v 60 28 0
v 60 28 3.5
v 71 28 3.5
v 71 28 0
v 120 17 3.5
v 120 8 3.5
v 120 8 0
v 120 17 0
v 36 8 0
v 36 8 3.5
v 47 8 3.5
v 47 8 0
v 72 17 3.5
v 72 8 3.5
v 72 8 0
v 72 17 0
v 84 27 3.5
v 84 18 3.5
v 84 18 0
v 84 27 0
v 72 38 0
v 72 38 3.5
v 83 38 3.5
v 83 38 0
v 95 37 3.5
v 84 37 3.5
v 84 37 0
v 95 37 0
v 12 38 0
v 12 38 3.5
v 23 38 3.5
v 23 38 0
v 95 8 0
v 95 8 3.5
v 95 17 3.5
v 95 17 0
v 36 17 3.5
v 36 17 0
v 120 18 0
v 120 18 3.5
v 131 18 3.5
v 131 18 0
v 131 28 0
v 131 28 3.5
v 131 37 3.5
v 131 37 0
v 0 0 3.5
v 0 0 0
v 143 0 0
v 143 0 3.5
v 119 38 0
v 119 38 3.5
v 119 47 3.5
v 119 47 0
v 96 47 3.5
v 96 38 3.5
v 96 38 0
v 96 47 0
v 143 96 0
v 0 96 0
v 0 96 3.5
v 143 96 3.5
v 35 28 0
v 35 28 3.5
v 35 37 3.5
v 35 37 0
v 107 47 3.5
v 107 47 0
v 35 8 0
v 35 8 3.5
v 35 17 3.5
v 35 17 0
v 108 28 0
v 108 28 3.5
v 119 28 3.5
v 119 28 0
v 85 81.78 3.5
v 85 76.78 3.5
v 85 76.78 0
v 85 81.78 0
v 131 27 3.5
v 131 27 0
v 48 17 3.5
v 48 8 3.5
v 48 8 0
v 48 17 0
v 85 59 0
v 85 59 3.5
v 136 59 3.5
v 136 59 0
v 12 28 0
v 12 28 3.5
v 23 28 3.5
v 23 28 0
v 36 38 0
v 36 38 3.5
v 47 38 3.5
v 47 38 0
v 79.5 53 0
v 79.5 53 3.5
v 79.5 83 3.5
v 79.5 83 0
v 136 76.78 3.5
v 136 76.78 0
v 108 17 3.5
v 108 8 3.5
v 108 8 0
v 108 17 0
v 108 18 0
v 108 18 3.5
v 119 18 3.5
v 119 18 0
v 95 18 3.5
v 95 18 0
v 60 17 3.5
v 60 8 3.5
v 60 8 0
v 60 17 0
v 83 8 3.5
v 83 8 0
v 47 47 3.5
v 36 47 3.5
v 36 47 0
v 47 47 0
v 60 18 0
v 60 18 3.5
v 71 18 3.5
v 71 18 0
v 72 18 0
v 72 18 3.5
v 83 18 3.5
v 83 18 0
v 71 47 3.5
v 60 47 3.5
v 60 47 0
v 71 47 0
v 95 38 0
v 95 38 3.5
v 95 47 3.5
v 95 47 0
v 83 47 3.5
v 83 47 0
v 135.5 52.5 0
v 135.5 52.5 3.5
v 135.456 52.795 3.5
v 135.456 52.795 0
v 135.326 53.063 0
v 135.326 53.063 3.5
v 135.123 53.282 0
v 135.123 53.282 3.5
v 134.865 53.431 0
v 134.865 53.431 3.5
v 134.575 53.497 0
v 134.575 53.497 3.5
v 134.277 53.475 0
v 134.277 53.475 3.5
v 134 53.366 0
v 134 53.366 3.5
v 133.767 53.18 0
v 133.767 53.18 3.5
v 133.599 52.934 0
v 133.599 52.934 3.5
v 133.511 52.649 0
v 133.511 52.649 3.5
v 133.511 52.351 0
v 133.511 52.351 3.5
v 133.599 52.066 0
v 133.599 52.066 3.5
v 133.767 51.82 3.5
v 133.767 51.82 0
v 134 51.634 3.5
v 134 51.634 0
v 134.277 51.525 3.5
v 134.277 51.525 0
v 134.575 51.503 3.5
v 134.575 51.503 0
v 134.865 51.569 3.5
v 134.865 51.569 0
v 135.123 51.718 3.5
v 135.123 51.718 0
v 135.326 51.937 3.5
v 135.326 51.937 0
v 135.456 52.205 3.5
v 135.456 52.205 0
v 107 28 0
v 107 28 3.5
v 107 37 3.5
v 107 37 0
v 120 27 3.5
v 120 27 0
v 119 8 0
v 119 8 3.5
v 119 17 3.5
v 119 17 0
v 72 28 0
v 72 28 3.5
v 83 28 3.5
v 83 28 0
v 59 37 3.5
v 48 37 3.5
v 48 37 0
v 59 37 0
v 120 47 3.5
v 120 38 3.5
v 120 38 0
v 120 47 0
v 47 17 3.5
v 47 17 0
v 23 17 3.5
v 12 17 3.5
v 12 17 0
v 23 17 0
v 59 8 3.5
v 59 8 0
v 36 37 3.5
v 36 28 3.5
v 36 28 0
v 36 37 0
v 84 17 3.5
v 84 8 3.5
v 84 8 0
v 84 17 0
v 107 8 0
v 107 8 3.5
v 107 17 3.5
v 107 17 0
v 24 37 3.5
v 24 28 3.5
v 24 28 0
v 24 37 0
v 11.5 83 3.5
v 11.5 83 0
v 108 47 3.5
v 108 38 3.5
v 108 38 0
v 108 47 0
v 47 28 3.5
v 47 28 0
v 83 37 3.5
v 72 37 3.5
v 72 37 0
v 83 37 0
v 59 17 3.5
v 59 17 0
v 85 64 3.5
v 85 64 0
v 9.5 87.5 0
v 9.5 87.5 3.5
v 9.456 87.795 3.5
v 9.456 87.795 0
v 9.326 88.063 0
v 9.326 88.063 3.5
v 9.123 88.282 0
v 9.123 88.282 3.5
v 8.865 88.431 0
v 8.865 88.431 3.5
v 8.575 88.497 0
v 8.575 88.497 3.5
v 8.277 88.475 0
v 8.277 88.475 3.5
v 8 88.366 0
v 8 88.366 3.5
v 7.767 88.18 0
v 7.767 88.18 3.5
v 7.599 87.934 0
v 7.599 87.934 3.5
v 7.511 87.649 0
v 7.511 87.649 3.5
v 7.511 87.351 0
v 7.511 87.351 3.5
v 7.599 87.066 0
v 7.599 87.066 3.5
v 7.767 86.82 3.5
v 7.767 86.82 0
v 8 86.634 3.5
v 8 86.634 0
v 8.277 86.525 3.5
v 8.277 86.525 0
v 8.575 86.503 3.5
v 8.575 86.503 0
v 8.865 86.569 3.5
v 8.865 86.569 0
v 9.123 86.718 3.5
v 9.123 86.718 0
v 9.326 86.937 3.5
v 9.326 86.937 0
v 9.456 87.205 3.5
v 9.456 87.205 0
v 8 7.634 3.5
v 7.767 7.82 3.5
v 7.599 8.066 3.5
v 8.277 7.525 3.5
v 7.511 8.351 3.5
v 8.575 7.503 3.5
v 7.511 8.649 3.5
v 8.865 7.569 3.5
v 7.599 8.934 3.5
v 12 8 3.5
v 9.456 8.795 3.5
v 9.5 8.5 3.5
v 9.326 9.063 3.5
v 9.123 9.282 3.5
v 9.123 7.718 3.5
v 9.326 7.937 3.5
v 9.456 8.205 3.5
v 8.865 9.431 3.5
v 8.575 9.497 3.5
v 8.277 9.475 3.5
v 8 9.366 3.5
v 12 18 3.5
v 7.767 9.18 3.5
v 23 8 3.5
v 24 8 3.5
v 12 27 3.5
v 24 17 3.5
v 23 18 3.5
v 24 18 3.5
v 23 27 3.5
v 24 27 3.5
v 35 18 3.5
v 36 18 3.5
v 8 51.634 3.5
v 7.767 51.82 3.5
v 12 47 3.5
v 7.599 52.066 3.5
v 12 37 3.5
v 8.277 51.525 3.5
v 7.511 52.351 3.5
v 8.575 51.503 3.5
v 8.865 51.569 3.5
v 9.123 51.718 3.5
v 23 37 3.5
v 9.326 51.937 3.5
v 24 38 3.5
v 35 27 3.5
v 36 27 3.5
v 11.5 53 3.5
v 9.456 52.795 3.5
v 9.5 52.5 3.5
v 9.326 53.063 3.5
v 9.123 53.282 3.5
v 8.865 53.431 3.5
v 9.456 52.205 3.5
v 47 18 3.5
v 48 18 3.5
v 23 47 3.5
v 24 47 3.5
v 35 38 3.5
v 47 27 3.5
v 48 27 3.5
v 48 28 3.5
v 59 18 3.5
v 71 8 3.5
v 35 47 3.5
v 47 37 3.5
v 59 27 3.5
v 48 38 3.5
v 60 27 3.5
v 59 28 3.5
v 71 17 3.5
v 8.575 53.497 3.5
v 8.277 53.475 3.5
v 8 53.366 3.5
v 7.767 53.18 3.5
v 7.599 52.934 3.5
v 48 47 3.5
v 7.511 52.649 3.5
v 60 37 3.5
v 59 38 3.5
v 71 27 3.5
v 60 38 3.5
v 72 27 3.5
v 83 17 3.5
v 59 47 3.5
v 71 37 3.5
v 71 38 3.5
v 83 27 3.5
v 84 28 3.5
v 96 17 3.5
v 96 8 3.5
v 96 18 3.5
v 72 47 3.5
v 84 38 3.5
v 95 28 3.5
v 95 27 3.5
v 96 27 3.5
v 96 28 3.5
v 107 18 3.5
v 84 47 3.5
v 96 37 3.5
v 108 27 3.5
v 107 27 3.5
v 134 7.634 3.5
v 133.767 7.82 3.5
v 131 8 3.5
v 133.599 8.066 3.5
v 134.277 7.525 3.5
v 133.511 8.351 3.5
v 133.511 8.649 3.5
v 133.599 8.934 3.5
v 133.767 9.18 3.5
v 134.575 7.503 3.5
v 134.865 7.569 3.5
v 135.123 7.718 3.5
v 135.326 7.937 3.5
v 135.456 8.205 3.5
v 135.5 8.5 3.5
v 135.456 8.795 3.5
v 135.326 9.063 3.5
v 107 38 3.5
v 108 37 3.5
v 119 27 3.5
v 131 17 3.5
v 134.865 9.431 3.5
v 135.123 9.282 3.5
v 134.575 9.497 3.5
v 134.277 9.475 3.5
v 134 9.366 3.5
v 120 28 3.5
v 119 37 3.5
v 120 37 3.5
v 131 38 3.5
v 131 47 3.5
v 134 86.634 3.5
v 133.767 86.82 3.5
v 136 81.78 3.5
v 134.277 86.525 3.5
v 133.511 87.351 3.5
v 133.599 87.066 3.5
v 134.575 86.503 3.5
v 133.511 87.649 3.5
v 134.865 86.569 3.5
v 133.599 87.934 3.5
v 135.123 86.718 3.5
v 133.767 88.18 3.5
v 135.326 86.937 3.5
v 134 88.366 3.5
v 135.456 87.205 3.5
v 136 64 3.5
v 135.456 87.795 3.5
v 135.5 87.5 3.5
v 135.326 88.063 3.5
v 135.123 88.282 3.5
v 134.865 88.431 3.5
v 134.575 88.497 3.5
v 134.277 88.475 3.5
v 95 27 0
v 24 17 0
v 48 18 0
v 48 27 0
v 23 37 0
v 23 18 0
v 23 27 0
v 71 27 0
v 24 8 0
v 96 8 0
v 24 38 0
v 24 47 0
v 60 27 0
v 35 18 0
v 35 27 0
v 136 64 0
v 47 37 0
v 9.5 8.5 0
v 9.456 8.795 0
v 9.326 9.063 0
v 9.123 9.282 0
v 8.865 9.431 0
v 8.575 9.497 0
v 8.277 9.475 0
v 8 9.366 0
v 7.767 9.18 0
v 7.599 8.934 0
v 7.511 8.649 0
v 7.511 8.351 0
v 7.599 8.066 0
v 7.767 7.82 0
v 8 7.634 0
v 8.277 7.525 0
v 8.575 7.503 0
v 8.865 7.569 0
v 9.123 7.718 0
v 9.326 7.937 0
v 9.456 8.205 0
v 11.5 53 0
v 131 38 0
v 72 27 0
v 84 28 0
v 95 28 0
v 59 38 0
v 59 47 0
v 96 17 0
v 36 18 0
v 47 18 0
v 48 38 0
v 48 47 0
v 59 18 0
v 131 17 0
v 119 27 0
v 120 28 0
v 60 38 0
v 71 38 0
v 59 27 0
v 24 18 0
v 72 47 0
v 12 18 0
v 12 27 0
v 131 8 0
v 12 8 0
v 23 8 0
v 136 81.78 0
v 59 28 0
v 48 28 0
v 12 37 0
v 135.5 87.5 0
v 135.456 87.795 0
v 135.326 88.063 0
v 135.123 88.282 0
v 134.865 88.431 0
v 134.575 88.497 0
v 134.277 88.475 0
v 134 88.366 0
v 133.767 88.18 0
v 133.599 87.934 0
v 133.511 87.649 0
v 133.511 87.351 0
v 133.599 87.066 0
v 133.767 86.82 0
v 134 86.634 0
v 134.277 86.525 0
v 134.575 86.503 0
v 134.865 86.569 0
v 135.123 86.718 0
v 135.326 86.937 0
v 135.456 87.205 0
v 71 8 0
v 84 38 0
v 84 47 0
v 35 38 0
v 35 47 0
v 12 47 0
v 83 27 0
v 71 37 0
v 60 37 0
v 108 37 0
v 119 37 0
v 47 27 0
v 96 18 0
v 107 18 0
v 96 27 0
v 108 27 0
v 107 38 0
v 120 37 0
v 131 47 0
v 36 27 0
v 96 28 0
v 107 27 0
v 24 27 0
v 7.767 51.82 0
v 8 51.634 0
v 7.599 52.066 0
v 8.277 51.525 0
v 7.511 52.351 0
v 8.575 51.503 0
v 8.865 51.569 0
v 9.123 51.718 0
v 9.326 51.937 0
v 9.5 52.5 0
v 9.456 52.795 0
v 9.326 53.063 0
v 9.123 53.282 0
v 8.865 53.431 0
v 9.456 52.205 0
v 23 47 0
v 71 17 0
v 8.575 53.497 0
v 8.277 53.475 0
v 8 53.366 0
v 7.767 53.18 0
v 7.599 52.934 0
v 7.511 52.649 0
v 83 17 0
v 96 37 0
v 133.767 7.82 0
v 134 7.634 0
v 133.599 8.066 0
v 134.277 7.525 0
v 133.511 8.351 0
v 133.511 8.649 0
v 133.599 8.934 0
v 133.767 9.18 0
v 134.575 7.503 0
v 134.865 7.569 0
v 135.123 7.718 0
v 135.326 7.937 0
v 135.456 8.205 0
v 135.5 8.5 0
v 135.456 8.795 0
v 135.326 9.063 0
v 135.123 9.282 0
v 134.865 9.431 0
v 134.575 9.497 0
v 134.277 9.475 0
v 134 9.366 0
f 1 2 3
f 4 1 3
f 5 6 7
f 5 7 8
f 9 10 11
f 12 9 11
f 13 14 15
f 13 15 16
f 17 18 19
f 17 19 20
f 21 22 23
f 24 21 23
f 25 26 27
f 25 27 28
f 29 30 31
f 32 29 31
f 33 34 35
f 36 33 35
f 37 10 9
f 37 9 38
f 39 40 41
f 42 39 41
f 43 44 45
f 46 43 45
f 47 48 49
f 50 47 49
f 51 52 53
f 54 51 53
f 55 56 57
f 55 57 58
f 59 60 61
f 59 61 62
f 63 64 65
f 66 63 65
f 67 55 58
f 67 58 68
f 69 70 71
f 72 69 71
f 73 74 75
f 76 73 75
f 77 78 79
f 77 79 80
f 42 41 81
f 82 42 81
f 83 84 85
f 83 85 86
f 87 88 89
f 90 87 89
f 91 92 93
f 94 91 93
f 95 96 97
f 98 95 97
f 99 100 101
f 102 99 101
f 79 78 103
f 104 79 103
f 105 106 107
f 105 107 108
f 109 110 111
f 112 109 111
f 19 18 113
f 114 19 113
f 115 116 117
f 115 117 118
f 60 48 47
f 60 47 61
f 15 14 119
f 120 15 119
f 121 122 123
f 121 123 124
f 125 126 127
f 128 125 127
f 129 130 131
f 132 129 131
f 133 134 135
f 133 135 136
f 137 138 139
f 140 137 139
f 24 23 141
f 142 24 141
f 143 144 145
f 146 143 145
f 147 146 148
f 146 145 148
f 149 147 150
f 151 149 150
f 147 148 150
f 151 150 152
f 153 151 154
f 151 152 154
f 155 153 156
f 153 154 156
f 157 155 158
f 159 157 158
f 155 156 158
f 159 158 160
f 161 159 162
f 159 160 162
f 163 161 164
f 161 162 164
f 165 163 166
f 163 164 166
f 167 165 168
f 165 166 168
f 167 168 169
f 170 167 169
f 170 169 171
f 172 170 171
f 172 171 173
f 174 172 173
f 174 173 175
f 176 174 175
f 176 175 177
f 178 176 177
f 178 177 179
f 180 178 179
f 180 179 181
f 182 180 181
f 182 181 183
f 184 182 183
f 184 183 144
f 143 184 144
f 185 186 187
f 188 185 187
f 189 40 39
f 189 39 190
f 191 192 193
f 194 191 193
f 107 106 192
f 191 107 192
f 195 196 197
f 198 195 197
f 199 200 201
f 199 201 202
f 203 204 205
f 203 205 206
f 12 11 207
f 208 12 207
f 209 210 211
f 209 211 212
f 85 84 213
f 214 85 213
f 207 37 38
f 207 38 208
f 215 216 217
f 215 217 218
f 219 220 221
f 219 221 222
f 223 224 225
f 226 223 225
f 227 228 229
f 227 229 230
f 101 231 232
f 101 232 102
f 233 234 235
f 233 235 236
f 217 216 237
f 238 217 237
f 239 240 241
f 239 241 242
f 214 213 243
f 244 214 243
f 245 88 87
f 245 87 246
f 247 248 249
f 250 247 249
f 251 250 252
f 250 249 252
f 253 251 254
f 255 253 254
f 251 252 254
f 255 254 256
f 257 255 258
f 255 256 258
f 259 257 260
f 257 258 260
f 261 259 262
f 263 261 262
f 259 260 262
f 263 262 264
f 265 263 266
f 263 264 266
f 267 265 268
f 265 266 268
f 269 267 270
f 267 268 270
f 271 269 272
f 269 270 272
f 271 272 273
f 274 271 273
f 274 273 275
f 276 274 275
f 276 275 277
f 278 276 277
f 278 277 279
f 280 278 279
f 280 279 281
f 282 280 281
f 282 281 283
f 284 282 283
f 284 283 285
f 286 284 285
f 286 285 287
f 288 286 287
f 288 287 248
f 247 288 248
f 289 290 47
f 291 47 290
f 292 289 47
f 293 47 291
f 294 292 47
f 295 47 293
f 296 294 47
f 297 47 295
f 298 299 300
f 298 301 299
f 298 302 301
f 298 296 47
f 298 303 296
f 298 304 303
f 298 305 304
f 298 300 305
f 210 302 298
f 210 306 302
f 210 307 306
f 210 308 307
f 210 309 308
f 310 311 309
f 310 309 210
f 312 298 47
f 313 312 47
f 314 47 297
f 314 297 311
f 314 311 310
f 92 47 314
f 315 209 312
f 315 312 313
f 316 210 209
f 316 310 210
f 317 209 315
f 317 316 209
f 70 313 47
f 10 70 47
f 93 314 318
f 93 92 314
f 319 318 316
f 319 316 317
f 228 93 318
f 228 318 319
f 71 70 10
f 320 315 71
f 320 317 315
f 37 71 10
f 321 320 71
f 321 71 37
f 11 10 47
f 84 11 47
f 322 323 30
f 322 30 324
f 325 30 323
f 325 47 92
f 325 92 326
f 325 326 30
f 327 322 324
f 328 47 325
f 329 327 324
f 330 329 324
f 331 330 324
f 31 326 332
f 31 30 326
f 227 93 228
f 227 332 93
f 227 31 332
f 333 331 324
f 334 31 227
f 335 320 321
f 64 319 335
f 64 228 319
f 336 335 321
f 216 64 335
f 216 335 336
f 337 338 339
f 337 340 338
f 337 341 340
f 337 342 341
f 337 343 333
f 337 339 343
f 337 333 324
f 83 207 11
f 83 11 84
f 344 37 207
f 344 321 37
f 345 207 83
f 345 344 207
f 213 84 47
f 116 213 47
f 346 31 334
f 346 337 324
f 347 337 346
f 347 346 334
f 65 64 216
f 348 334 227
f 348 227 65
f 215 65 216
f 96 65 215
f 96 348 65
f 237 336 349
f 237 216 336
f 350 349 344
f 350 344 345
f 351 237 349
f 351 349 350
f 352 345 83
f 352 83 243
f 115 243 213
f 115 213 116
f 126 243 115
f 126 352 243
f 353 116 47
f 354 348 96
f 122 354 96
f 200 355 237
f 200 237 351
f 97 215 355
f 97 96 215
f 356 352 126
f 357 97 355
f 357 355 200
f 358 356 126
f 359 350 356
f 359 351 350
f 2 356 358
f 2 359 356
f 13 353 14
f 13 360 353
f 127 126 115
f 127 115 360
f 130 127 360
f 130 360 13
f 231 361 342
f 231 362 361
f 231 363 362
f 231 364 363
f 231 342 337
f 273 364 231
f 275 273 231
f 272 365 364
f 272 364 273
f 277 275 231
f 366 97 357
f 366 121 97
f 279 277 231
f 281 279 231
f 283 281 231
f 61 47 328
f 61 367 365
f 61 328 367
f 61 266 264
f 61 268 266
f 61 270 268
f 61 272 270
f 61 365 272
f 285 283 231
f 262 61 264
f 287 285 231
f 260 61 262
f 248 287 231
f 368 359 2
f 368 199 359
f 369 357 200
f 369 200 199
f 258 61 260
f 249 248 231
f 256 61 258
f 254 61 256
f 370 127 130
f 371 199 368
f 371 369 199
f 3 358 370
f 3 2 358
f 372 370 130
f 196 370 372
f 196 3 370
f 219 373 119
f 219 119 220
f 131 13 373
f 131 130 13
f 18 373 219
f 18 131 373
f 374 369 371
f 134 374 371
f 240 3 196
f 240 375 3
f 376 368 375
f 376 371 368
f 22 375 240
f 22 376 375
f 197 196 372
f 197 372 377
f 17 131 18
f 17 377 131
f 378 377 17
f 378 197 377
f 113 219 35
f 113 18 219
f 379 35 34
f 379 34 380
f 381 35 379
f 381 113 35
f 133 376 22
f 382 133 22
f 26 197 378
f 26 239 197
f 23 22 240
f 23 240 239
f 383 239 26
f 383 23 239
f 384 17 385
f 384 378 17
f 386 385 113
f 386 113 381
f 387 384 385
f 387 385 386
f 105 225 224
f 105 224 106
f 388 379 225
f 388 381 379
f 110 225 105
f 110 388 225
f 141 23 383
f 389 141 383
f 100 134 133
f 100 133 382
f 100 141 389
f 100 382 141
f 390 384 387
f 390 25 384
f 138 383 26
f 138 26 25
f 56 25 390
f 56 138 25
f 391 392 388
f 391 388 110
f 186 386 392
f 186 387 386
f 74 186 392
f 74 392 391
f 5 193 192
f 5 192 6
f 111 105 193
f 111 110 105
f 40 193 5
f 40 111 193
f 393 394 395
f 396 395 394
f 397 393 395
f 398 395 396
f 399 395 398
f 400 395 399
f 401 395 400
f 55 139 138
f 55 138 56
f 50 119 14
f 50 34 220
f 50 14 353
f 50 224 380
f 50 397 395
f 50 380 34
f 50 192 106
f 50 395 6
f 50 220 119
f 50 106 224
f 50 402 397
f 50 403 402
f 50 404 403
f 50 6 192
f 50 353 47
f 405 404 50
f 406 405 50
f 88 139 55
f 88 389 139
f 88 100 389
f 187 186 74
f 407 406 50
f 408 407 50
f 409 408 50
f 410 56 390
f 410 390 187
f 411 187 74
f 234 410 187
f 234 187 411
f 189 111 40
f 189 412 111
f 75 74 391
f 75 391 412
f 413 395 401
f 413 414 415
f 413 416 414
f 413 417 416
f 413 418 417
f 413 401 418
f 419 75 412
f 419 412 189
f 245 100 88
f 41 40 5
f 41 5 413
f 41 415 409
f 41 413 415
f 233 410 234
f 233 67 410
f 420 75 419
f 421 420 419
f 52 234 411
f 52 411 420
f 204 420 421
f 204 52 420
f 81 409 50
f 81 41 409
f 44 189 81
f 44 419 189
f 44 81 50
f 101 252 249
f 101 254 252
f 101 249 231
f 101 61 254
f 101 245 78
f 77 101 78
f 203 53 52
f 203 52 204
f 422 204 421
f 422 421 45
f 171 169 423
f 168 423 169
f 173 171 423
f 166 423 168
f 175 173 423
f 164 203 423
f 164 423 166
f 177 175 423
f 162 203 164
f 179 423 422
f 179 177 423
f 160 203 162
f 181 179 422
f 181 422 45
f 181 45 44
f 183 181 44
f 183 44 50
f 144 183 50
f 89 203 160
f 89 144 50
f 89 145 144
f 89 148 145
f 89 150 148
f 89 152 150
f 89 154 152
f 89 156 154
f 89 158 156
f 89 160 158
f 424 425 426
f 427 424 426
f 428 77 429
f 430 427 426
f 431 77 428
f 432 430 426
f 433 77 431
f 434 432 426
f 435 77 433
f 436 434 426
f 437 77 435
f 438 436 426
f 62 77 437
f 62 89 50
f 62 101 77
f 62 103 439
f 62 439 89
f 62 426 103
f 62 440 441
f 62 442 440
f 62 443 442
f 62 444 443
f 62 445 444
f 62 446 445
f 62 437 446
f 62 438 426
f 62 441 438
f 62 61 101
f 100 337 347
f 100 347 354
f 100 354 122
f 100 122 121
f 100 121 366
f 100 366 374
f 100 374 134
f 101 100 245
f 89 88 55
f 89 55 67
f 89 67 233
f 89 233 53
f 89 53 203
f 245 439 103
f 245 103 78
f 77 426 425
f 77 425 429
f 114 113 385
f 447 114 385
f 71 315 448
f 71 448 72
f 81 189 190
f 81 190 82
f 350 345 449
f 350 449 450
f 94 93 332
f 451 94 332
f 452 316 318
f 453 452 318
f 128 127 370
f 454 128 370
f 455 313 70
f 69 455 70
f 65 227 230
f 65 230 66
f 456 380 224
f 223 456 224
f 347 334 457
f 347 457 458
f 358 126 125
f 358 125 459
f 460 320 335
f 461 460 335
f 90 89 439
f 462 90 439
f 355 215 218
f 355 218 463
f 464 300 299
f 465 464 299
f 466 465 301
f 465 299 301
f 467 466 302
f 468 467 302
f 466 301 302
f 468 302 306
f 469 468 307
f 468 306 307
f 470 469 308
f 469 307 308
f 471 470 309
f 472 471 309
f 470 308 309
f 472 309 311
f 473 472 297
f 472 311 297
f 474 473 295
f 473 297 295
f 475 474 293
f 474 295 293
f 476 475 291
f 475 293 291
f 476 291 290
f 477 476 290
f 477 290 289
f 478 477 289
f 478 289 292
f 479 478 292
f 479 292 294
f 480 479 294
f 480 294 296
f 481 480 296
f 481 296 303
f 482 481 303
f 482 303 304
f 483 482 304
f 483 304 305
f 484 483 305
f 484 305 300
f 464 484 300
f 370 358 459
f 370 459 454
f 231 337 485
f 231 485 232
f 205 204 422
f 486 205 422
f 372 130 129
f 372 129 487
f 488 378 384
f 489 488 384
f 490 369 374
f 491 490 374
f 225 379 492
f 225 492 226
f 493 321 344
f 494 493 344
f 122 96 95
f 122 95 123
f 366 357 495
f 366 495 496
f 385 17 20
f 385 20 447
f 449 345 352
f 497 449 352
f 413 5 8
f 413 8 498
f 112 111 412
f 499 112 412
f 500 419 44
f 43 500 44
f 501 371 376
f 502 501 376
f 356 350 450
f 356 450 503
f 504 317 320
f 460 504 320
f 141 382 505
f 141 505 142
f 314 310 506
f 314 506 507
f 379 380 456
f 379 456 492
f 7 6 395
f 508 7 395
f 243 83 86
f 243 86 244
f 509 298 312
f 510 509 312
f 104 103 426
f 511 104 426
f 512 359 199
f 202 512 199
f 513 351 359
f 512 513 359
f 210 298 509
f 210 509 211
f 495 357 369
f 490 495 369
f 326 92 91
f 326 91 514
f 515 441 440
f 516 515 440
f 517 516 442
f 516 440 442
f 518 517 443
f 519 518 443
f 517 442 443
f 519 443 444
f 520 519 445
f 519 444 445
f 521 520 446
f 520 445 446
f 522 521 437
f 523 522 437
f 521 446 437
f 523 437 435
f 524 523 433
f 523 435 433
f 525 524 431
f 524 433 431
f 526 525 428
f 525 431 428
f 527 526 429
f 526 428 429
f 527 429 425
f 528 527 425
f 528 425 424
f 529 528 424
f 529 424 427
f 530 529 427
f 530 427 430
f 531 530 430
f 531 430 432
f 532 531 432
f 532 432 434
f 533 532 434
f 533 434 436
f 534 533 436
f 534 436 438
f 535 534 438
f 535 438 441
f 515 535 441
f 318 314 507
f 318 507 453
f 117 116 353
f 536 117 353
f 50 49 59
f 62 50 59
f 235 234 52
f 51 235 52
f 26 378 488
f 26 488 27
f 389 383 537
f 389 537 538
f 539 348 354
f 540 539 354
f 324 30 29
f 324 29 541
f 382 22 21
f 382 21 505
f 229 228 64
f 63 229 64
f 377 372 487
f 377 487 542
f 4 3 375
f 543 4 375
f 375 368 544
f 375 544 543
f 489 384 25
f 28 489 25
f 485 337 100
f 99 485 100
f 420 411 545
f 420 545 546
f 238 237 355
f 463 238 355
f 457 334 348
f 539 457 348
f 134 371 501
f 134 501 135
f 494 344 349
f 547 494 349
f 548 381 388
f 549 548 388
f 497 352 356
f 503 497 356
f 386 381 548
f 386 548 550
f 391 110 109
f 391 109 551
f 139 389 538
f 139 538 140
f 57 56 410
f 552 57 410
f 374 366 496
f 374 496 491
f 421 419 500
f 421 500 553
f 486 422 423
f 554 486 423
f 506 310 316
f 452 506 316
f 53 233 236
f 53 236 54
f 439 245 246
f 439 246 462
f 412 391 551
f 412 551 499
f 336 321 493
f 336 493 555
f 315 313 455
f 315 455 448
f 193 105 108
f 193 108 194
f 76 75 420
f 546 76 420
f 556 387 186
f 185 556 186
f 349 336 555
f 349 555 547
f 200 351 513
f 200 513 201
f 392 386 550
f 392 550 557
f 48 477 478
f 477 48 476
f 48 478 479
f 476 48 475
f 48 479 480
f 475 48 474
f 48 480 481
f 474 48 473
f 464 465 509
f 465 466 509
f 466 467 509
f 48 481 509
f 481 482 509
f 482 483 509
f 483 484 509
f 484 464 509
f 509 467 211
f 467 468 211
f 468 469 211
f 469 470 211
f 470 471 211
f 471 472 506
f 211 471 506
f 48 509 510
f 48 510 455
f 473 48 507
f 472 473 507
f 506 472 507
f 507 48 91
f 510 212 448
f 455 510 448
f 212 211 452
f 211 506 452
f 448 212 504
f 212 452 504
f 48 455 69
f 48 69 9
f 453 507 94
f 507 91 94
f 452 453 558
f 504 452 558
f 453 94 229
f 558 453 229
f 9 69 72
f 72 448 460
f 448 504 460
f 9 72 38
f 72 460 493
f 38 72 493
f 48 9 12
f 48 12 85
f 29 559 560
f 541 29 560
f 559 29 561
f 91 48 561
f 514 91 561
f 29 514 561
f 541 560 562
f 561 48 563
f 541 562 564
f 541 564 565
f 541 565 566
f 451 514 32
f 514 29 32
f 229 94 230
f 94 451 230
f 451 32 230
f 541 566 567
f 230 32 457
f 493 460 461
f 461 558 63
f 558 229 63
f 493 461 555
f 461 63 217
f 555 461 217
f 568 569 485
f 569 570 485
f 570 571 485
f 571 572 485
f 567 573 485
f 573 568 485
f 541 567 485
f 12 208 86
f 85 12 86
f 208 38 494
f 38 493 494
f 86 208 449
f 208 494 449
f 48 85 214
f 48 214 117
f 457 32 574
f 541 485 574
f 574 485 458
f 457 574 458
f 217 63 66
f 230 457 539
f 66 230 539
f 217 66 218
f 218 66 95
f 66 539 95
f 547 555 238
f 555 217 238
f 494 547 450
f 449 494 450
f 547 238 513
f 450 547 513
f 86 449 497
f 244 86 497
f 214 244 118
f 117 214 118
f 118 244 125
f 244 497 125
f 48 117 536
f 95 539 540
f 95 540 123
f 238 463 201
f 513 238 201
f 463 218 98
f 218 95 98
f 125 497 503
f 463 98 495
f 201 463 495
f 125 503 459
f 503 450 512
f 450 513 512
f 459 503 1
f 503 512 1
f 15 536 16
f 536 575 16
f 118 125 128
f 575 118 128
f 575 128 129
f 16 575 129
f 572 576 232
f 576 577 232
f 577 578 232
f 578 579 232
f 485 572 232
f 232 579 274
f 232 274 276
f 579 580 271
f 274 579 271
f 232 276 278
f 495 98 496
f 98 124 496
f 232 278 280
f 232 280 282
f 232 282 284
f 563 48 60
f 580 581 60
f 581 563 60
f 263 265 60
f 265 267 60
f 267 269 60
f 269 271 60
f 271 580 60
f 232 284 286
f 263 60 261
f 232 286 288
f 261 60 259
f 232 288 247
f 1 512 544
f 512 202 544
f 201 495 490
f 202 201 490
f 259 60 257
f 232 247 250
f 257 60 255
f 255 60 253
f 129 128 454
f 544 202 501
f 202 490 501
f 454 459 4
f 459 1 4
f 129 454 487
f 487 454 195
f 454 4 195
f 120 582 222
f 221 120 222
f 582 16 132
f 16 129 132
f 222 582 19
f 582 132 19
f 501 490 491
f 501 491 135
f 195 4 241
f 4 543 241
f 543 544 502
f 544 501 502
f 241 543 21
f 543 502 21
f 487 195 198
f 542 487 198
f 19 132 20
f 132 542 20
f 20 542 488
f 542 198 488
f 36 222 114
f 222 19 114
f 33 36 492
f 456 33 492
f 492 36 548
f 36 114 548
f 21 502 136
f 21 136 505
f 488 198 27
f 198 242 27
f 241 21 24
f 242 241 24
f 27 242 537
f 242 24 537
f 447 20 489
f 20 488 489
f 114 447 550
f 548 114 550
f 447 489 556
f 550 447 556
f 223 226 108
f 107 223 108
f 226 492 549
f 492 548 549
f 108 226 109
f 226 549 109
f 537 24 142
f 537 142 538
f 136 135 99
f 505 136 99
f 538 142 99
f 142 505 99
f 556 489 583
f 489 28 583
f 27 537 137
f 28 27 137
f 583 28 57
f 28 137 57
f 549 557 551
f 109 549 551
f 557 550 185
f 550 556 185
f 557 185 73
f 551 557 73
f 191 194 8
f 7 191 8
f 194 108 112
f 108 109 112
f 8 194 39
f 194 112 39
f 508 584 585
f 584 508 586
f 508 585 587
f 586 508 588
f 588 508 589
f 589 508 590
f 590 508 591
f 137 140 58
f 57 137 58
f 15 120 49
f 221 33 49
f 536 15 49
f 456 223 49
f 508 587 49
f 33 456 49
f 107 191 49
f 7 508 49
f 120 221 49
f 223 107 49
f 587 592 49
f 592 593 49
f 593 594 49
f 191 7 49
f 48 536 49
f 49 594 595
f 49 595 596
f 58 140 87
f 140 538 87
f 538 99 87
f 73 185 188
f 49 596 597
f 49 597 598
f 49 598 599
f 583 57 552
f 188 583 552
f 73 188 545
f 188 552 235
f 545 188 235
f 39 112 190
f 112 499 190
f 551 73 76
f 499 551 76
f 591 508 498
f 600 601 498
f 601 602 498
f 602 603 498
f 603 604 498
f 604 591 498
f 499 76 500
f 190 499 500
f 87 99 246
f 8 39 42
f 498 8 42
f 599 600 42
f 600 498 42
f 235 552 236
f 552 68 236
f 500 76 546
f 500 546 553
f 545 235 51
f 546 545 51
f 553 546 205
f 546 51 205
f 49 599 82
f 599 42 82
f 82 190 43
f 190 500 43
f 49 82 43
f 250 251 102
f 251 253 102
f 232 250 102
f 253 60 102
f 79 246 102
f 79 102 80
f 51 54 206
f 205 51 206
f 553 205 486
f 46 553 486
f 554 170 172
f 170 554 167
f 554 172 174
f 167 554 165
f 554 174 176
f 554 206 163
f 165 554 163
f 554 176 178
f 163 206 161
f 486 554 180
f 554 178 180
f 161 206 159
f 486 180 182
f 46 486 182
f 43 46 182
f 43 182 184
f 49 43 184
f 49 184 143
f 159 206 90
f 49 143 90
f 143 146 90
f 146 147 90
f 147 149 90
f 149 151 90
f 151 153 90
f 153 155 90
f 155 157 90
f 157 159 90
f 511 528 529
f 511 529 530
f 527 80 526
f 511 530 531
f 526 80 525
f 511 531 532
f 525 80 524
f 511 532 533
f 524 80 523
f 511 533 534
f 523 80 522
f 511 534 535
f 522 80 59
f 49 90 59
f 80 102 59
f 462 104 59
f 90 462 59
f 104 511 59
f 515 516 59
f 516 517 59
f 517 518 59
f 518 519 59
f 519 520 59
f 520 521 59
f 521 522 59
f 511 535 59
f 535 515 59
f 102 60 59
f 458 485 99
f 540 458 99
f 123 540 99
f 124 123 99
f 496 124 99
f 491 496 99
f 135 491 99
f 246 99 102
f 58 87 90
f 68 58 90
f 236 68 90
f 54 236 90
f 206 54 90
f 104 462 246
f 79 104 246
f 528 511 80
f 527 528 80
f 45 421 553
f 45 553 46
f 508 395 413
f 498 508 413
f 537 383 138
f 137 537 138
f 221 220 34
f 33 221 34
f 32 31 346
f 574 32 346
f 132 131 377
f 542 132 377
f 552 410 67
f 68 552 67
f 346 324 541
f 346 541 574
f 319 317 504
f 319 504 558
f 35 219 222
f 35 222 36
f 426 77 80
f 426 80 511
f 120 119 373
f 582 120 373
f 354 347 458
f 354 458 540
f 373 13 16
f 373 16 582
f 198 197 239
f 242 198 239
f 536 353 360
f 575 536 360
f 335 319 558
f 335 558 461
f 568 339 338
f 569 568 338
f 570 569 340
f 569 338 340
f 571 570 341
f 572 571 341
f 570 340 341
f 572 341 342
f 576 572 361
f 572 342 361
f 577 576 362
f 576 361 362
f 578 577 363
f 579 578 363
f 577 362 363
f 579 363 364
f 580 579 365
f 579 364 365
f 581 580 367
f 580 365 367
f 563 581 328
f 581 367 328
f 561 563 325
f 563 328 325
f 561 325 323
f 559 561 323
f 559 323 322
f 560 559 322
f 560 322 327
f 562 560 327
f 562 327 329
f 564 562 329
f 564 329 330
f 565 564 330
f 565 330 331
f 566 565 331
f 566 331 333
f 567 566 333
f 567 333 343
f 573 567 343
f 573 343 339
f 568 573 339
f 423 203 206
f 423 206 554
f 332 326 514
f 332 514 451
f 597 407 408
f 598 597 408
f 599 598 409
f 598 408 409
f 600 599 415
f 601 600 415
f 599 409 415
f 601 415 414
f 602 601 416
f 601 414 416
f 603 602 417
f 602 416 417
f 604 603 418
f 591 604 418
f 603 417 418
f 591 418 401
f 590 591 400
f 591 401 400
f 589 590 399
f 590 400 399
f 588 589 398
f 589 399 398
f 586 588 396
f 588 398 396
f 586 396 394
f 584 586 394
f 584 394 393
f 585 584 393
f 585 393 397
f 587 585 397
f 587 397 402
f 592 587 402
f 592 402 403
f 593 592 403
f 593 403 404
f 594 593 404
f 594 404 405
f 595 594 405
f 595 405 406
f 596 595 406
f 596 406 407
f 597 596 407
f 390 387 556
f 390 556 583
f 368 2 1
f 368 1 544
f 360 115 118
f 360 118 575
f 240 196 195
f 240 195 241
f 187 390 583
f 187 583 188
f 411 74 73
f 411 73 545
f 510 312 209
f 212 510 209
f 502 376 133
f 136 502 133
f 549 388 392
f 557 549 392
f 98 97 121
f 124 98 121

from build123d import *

# Parameters (mm, degrees)
SKETCH006_W     = 143
SKETCH006_H     = 96
PAD003_DEPTH    = 3.5
SKETCH007_W     = 68
SKETCH007_H     = 30
POCKET003_DEPTH = 3.501
SKETCH008_W     = 11
SKETCH008_H     = 9
POCKET004_DEPTH = 3.501
SKETCH009_W     = 51
SKETCH009_H     = 5
POCKET005_DEPTH = 3.501
SKETCH010_R     = 1
POCKET006_DEPTH = 3.501


with BuildPart() as part:
    # Sketch006 → Pad003 (new body)
    with BuildSketch(Plane.XY):
        with Locations((71.5, 48)):
            Rectangle(SKETCH006_W, SKETCH006_H)
    extrude(amount=PAD003_DEPTH)

    # Sketch007 (on Face6 of Pad003) → Pocket003 (cut, through all)
    with BuildSketch(Plane.XY.offset(3.5)):
        with Locations((45.5, 68)):
            Rectangle(SKETCH007_W, SKETCH007_H)
    extrude(amount=-POCKET003_DEPTH, mode=Mode.SUBTRACT)

    # Sketch008 (on Face5 of Pocket003) → Pocket004 (cut, through all)
    with BuildSketch(Plane.XY.offset(3.5)):
        with Locations((17.5, 42.5)):
            Rectangle(SKETCH008_W, SKETCH008_H)
        with Locations((29.5, 42.5)):
            Rectangle(SKETCH008_W, SKETCH008_H)
        with Locations((41.5, 42.5)):
            Rectangle(SKETCH008_W, SKETCH008_H)
        with Locations((53.5, 42.5)):
            Rectangle(SKETCH008_W, SKETCH008_H)
        with Locations((65.5, 42.5)):
            Rectangle(SKETCH008_W, SKETCH008_H)
        with Locations((77.5, 42.5)):
            Rectangle(SKETCH008_W, SKETCH008_H)
        with Locations((89.5, 42.5)):
            Rectangle(SKETCH008_W, SKETCH008_H)
        with Locations((101.5, 42.5)):
            Rectangle(SKETCH008_W, SKETCH008_H)
        with Locations((113.5, 42.5)):
            Rectangle(SKETCH008_W, SKETCH008_H)
        with Locations((125.5, 42.5)):
            Rectangle(SKETCH008_W, SKETCH008_H)
        with Locations((17.5, 32.5)):
            Rectangle(SKETCH008_W, SKETCH008_H)
        with Locations((29.5, 32.5)):
            Rectangle(SKETCH008_W, SKETCH008_H)
        with Locations((41.5, 32.5)):
            Rectangle(SKETCH008_W, SKETCH008_H)
        with Locations((53.5, 32.5)):
            Rectangle(SKETCH008_W, SKETCH008_H)
        with Locations((65.5, 32.5)):
            Rectangle(SKETCH008_W, SKETCH008_H)
        with Locations((77.5, 32.5)):
            Rectangle(SKETCH008_W, SKETCH008_H)
        with Locations((89.5, 32.5)):
            Rectangle(SKETCH008_W, SKETCH008_H)
        with Locations((101.5, 32.5)):
            Rectangle(SKETCH008_W, SKETCH008_H)
        with Locations((113.5, 32.5)):
            Rectangle(SKETCH008_W, SKETCH008_H)
        with Locations((125.5, 32.5)):
            Rectangle(SKETCH008_W, SKETCH008_H)
        with Locations((17.5, 22.5)):
            Rectangle(SKETCH008_W, SKETCH008_H)
        with Locations((29.5, 22.5)):
            Rectangle(SKETCH008_W, SKETCH008_H)
        with Locations((41.5, 22.5)):
            Rectangle(SKETCH008_W, SKETCH008_H)
        with Locations((53.5, 22.5)):
            Rectangle(SKETCH008_W, SKETCH008_H)
        with Locations((65.5, 22.5)):
            Rectangle(SKETCH008_W, SKETCH008_H)
        with Locations((77.5, 22.5)):
            Rectangle(SKETCH008_W, SKETCH008_H)
        with Locations((89.5, 22.5)):
            Rectangle(SKETCH008_W, SKETCH008_H)
        with Locations((101.5, 22.5)):
            Rectangle(SKETCH008_W, SKETCH008_H)
        with Locations((113.5, 22.5)):
            Rectangle(SKETCH008_W, SKETCH008_H)
        with Locations((125.5, 22.5)):
            Rectangle(SKETCH008_W, SKETCH008_H)
        with Locations((17.5, 12.5)):
            Rectangle(SKETCH008_W, SKETCH008_H)
        with Locations((29.5, 12.5)):
            Rectangle(SKETCH008_W, SKETCH008_H)
        with Locations((41.5, 12.5)):
            Rectangle(SKETCH008_W, SKETCH008_H)
        with Locations((53.5, 12.5)):
            Rectangle(SKETCH008_W, SKETCH008_H)
        with Locations((65.5, 12.5)):
            Rectangle(SKETCH008_W, SKETCH008_H)
        with Locations((77.5, 12.5)):
            Rectangle(SKETCH008_W, SKETCH008_H)
        with Locations((89.5, 12.5)):
            Rectangle(SKETCH008_W, SKETCH008_H)
        with Locations((101.5, 12.5)):
            Rectangle(SKETCH008_W, SKETCH008_H)
        with Locations((113.5, 12.5)):
            Rectangle(SKETCH008_W, SKETCH008_H)
        with Locations((125.5, 12.5)):
            Rectangle(SKETCH008_W, SKETCH008_H)
    extrude(amount=-POCKET004_DEPTH, mode=Mode.SUBTRACT)

    # Sketch009 (on Face5 of Pocket004) → Pocket005 (cut, through all)
    with BuildSketch(Plane.XY.offset(3.5)):
        with Locations((110.5, 79.28)):
            Rectangle(SKETCH009_W, SKETCH009_H)
        with Locations((110.5, 61.5)):
            Rectangle(SKETCH009_W, SKETCH009_H)
    extrude(amount=-POCKET005_DEPTH, mode=Mode.SUBTRACT)

    # Sketch010 (on Face5 of Pocket005) → Pocket006 (cut, through all)
    with BuildSketch(Plane.XY.offset(3.5)):
        with Locations((8.5, 87.5)):
            Circle(SKETCH010_R)
        with Locations((134.5, 87.5)):
            Circle(SKETCH010_R)
        with Locations((8.5, 52.5)):
            Circle(SKETCH010_R)
        with Locations((134.5, 52.5)):
            Circle(SKETCH010_R)
        with Locations((8.5, 8.5)):
            Circle(SKETCH010_R)
        with Locations((134.5, 8.5)):
            Circle(SKETCH010_R)
    extrude(amount=-POCKET006_DEPTH, mode=Mode.SUBTRACT)


solid = part.part
